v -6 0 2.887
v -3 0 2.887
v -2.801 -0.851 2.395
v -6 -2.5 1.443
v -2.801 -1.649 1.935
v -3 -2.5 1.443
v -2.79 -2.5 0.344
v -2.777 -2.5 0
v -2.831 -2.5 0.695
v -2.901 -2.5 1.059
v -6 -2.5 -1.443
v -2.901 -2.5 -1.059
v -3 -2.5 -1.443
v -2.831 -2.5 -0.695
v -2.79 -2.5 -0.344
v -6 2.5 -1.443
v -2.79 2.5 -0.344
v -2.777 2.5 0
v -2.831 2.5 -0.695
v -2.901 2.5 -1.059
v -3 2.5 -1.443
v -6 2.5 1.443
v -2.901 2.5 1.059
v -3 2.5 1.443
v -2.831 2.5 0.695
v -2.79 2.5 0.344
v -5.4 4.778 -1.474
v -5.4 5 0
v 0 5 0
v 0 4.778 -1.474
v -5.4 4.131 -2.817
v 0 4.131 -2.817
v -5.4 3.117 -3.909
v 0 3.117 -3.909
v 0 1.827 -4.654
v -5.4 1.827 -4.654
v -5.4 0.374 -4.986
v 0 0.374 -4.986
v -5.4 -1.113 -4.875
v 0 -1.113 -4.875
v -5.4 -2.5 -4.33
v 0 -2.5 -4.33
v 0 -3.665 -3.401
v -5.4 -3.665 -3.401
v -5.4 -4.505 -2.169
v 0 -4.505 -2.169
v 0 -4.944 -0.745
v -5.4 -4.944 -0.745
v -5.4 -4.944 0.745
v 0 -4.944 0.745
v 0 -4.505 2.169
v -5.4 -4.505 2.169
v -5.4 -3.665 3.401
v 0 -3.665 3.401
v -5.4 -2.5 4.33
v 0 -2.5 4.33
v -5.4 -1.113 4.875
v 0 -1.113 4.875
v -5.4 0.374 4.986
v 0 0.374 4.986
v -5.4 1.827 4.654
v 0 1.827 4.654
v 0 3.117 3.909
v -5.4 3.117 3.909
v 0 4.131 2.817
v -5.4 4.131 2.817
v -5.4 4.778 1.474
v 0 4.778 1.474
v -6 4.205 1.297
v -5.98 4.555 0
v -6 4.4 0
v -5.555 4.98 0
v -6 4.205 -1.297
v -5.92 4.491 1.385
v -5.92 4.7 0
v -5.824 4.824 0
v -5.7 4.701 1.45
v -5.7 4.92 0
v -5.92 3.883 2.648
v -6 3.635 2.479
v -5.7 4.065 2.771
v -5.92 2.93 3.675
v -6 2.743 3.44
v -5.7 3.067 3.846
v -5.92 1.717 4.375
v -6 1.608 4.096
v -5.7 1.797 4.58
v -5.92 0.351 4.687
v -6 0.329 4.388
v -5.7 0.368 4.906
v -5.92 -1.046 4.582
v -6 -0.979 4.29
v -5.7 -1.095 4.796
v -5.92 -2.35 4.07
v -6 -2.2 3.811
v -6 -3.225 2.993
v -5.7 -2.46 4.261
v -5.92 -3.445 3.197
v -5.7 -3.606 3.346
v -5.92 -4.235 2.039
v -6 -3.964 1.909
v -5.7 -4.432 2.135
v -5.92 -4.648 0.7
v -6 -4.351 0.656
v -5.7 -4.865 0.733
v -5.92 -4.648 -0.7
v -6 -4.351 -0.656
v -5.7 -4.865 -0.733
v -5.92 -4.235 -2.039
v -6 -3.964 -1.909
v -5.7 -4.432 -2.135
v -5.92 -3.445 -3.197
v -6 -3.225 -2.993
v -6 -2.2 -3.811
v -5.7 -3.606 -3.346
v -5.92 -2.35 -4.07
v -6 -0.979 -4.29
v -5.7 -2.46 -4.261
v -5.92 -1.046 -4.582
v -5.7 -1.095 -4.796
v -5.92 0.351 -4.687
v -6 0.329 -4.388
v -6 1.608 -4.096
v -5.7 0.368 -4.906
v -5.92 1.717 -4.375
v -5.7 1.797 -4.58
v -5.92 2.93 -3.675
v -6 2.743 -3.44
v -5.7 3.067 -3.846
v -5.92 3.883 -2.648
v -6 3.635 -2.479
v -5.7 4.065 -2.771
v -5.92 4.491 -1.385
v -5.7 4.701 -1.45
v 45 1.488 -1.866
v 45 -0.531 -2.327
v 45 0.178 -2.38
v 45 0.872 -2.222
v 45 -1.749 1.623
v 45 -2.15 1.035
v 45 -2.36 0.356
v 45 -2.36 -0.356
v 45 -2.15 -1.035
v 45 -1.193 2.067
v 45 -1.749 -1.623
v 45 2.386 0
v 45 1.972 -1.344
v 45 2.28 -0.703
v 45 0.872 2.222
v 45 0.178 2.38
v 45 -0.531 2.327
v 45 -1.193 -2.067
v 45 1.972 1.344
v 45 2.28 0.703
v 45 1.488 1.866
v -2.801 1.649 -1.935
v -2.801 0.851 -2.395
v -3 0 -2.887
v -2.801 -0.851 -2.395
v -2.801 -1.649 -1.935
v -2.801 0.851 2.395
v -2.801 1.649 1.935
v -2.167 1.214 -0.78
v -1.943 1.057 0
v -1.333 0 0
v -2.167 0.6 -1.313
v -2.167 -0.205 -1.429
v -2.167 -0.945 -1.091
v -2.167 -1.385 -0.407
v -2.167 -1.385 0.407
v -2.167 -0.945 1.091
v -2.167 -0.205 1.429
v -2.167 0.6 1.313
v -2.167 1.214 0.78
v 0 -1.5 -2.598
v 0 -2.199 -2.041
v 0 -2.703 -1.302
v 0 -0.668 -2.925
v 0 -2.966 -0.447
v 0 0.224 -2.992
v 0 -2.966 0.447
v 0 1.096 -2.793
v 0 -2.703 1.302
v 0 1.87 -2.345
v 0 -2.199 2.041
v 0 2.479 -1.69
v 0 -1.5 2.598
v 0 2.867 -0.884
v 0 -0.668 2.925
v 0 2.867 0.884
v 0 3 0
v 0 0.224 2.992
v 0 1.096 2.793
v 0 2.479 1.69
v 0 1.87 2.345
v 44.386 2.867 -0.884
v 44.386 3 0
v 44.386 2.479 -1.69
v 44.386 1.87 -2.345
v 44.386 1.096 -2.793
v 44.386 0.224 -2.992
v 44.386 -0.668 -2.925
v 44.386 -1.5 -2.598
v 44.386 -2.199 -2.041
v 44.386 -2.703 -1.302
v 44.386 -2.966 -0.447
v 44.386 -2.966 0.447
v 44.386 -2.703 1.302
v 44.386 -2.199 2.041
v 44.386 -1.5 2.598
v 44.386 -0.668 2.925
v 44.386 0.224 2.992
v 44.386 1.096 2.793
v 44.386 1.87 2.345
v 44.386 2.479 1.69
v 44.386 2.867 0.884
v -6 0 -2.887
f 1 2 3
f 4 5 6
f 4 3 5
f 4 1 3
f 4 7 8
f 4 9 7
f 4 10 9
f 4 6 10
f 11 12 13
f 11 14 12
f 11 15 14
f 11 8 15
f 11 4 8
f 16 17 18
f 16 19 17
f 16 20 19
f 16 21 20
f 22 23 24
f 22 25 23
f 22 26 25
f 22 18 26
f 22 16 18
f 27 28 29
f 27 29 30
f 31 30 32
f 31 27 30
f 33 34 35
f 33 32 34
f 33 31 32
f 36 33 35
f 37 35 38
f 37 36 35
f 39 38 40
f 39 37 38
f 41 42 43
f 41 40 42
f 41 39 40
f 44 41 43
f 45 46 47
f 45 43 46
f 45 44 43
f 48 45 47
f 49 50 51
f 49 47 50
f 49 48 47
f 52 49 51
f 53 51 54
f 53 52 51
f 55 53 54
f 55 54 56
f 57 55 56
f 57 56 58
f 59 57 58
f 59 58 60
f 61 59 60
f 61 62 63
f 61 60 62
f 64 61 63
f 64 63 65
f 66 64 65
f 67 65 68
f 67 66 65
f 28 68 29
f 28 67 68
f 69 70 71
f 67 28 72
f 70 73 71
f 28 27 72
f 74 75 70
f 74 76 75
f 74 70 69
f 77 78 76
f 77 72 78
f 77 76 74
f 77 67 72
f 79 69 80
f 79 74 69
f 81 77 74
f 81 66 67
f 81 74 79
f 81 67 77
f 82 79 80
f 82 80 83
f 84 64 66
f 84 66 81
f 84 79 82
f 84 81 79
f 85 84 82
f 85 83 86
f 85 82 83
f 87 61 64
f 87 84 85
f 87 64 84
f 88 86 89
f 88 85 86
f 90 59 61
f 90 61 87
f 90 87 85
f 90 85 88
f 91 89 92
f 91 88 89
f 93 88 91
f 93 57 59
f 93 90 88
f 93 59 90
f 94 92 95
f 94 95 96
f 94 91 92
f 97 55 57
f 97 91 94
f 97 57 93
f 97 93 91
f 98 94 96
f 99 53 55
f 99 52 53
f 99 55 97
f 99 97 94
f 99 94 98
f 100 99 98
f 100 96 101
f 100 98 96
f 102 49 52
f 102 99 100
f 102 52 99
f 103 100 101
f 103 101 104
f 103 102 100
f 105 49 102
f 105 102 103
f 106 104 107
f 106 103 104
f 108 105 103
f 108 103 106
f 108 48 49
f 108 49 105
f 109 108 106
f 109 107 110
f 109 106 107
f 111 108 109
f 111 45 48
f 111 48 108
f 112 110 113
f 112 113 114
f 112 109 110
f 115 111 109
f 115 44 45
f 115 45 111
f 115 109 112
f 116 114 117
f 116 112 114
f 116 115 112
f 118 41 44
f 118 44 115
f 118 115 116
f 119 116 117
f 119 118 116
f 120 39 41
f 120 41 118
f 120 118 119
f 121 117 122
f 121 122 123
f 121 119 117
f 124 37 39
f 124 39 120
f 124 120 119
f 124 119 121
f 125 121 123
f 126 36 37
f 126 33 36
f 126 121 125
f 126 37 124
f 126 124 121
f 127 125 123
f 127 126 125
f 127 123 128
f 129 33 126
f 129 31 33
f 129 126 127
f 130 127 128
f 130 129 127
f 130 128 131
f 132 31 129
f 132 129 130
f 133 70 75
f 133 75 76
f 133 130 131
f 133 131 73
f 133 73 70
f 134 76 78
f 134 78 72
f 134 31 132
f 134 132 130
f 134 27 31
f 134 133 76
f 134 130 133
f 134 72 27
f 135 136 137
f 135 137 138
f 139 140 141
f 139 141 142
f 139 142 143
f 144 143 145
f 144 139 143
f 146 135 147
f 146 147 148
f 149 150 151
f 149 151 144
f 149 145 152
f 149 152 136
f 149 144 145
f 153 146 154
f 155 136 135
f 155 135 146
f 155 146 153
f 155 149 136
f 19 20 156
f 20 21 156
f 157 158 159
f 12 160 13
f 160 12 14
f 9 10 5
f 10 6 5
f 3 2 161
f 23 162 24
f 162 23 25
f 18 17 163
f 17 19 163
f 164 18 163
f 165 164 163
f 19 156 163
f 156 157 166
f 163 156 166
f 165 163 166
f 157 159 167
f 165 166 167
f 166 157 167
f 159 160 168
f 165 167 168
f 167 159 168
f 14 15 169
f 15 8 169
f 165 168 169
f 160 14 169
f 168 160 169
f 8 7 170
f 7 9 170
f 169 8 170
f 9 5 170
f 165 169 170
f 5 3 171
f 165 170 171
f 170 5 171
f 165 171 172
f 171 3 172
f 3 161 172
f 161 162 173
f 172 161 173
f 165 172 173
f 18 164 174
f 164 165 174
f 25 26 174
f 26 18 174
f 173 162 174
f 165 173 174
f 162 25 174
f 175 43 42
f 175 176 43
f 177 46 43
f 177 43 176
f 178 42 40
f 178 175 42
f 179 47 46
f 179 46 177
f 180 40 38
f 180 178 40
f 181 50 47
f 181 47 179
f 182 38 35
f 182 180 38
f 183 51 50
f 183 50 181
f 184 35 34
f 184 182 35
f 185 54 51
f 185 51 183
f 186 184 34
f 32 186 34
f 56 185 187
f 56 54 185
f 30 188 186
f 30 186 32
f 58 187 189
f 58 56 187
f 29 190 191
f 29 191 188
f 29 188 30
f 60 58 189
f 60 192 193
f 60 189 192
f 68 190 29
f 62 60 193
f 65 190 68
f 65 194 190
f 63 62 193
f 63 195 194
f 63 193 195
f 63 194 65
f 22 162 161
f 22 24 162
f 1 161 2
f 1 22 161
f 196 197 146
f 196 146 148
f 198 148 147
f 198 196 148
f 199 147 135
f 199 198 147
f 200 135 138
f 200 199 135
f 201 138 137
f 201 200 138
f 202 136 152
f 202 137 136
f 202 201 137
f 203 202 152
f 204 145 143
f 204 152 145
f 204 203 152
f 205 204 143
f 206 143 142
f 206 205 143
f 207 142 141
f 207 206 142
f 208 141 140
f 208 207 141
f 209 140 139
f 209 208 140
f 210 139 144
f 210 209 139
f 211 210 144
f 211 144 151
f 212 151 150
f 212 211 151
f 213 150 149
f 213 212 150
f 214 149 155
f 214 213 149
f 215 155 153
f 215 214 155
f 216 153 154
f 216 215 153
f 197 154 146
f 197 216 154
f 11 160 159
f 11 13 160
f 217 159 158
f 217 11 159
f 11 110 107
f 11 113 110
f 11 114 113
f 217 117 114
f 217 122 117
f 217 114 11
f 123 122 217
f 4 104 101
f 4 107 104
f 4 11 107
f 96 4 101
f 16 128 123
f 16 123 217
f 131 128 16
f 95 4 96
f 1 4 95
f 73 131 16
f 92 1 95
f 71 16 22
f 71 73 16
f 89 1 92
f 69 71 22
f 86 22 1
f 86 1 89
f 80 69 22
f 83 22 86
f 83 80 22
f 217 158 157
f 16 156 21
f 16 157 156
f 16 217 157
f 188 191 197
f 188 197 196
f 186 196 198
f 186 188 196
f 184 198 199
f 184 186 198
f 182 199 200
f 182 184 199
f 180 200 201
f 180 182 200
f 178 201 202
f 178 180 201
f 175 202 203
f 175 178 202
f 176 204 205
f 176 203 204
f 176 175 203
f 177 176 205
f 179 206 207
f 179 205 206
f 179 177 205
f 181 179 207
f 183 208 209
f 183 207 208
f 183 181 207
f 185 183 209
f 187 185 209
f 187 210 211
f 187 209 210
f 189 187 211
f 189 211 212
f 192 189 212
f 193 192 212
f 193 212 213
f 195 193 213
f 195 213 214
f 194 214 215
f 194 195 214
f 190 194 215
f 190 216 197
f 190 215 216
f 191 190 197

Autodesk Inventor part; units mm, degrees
ref_plane "YZ Plane" through (0, 0, 0) normal (1, 0, 0) x (0, 1, 0)
ref_plane "XZ Plane" through (0, 0, 0) normal (0, 1, 0) x (-1, 0, 0)
sketch "Sketch1" plane through (0, 0, 0) normal (0, 0, 1) x (1, 0, 0)
  line L0 (-1.3333, 0) -> (45, 0)
  line L1 (45, 0) -> (45, 3)
  line L2 (45, 3) -> (21, 3)
  line L3 (21, 3) -> (20.3864, 3)
  line L4 (20.3864, 3) -> (0, 3)
  line L5 (0, 3) -> (0, 5)
  line L6 (0, 5) -> (-6, 5)
  line L7 (-6, 5) -> (-6, 2.8868)
  line L8 (-6, 2.8868) -> (-3, 2.8868)
  line L9 (-3, 2.8868) -> (-1.3333, 0)
  line L10 (-11.1, 0) -> (60.3, 0) projected
  line L11 (0, -0.5) -> (0, 6.5) projected
  line L12 (21, 3) -> (0, 3) construction
  dimension "d1" = 24
  dimension "d2" = 0.6136
  dimension "d3" = 6
  dimension "d4" = 3
  dimension "d5" = 60
  dimension "d6" = 6
  dimension "d7" = 6
  dimension "d8" = 5.7735
  dimension "d9" = 10
  dimension "d26" = 45
revolve "Body" add sketch "Sketch1" angle 360 about axis through (-1.3333, 0, 0) along (1, 0, 0)
sketch "Sketch2" plane through (-6, 0, 0) normal (-1, 0, 0) x (0, 0, 1)
  circle A0 centre (0, 0) radius 2.8868 projected
  line L0 (0, -6) -> (0, 8) projected
  line L1 (-6, 0) -> (8, 0) projected
  line L2 (2.8868, 0) -> (1.4434, -2.5)
  line L3 (1.4434, -2.5) -> (-1.4434, -2.5)
  line L4 (-1.4434, -2.5) -> (-2.8868, 0)
  line L5 (-2.8868, 0) -> (-1.4434, 2.5)
  line L6 (-1.4434, 2.5) -> (1.4434, 2.5)
  line L7 (1.4434, 2.5) -> (2.8868, 0)
extrude "Slot" add sketch "Sketch2" against normal up to next contours L7 A0 | A0 L2 | L6 L0 A0 | A0 L0 L3 | L0 L6 A0 | A0 L3 L0 | L4 A0 | A0 L5
fillet "Fillet1" radius 0.6 1 edges at (-6, -5, 0)
thread "Thread" size "M6x1" class "6g" standard "ISO Metric profile" length 24
chamfer "Chamfer1" distance 0.6135 distance2 0.6135 1 edges at (45, -3, 0) measured on face at (45, -0.5525, -1.8157)
ref_plane "Work Plane1" through (29, 0, 0) normal (0, -1, 0) x (1, 0, 0)
equation "\"d1\" = GEL"
equation "\"d3\" = KOH"
equation "\"d4\" = INTI"
equation "\"d6\" = GD"
equation "\"d7\" = BDM"
equation "\"d8\" = 1.1547 * SW"
equation "\"d9\" = KOD"
equation "\"d26\" = NLG"
equation "\"d17\" = RR"
equation "\"d13\" = GEL"
equation "\"d15\" = -0.5 * SPD + 0.5 * GD"
equation "\"d16\" = GUL"
equation "\"GD\" = 6"
equation "\"NLG\" = 45"
equation "\"GEL\" = 24"
equation "\"KOD\" = 10"
equation "\"KOH\" = 6"
equation "\"INTI\" = 3"
equation "\"GAL\" = 0.61345 * PTC"
equation "\"GUL\" = 0.61345 * PTC"
equation "\"BDM\" = NND"
equation "\"SW\" = 5"
equation "\"RR\" = 0.6"
equation "\"SPD\" = NND - 1.2269 * PTC"
equation "\"TOA\" = 30deg"
equation "\"GD1\" = THREADDIA - 1.2269 * PTC"
equation "\"THREADDIA\" = 6"
equation "\"FAWI\" = 45deg"
equation "\"PTC\" = 1"
equation "\"NND\" = 6"
equation "\"E0\" = 1.155 * SW"
properties part number "100011" material "Steel, Mild"
